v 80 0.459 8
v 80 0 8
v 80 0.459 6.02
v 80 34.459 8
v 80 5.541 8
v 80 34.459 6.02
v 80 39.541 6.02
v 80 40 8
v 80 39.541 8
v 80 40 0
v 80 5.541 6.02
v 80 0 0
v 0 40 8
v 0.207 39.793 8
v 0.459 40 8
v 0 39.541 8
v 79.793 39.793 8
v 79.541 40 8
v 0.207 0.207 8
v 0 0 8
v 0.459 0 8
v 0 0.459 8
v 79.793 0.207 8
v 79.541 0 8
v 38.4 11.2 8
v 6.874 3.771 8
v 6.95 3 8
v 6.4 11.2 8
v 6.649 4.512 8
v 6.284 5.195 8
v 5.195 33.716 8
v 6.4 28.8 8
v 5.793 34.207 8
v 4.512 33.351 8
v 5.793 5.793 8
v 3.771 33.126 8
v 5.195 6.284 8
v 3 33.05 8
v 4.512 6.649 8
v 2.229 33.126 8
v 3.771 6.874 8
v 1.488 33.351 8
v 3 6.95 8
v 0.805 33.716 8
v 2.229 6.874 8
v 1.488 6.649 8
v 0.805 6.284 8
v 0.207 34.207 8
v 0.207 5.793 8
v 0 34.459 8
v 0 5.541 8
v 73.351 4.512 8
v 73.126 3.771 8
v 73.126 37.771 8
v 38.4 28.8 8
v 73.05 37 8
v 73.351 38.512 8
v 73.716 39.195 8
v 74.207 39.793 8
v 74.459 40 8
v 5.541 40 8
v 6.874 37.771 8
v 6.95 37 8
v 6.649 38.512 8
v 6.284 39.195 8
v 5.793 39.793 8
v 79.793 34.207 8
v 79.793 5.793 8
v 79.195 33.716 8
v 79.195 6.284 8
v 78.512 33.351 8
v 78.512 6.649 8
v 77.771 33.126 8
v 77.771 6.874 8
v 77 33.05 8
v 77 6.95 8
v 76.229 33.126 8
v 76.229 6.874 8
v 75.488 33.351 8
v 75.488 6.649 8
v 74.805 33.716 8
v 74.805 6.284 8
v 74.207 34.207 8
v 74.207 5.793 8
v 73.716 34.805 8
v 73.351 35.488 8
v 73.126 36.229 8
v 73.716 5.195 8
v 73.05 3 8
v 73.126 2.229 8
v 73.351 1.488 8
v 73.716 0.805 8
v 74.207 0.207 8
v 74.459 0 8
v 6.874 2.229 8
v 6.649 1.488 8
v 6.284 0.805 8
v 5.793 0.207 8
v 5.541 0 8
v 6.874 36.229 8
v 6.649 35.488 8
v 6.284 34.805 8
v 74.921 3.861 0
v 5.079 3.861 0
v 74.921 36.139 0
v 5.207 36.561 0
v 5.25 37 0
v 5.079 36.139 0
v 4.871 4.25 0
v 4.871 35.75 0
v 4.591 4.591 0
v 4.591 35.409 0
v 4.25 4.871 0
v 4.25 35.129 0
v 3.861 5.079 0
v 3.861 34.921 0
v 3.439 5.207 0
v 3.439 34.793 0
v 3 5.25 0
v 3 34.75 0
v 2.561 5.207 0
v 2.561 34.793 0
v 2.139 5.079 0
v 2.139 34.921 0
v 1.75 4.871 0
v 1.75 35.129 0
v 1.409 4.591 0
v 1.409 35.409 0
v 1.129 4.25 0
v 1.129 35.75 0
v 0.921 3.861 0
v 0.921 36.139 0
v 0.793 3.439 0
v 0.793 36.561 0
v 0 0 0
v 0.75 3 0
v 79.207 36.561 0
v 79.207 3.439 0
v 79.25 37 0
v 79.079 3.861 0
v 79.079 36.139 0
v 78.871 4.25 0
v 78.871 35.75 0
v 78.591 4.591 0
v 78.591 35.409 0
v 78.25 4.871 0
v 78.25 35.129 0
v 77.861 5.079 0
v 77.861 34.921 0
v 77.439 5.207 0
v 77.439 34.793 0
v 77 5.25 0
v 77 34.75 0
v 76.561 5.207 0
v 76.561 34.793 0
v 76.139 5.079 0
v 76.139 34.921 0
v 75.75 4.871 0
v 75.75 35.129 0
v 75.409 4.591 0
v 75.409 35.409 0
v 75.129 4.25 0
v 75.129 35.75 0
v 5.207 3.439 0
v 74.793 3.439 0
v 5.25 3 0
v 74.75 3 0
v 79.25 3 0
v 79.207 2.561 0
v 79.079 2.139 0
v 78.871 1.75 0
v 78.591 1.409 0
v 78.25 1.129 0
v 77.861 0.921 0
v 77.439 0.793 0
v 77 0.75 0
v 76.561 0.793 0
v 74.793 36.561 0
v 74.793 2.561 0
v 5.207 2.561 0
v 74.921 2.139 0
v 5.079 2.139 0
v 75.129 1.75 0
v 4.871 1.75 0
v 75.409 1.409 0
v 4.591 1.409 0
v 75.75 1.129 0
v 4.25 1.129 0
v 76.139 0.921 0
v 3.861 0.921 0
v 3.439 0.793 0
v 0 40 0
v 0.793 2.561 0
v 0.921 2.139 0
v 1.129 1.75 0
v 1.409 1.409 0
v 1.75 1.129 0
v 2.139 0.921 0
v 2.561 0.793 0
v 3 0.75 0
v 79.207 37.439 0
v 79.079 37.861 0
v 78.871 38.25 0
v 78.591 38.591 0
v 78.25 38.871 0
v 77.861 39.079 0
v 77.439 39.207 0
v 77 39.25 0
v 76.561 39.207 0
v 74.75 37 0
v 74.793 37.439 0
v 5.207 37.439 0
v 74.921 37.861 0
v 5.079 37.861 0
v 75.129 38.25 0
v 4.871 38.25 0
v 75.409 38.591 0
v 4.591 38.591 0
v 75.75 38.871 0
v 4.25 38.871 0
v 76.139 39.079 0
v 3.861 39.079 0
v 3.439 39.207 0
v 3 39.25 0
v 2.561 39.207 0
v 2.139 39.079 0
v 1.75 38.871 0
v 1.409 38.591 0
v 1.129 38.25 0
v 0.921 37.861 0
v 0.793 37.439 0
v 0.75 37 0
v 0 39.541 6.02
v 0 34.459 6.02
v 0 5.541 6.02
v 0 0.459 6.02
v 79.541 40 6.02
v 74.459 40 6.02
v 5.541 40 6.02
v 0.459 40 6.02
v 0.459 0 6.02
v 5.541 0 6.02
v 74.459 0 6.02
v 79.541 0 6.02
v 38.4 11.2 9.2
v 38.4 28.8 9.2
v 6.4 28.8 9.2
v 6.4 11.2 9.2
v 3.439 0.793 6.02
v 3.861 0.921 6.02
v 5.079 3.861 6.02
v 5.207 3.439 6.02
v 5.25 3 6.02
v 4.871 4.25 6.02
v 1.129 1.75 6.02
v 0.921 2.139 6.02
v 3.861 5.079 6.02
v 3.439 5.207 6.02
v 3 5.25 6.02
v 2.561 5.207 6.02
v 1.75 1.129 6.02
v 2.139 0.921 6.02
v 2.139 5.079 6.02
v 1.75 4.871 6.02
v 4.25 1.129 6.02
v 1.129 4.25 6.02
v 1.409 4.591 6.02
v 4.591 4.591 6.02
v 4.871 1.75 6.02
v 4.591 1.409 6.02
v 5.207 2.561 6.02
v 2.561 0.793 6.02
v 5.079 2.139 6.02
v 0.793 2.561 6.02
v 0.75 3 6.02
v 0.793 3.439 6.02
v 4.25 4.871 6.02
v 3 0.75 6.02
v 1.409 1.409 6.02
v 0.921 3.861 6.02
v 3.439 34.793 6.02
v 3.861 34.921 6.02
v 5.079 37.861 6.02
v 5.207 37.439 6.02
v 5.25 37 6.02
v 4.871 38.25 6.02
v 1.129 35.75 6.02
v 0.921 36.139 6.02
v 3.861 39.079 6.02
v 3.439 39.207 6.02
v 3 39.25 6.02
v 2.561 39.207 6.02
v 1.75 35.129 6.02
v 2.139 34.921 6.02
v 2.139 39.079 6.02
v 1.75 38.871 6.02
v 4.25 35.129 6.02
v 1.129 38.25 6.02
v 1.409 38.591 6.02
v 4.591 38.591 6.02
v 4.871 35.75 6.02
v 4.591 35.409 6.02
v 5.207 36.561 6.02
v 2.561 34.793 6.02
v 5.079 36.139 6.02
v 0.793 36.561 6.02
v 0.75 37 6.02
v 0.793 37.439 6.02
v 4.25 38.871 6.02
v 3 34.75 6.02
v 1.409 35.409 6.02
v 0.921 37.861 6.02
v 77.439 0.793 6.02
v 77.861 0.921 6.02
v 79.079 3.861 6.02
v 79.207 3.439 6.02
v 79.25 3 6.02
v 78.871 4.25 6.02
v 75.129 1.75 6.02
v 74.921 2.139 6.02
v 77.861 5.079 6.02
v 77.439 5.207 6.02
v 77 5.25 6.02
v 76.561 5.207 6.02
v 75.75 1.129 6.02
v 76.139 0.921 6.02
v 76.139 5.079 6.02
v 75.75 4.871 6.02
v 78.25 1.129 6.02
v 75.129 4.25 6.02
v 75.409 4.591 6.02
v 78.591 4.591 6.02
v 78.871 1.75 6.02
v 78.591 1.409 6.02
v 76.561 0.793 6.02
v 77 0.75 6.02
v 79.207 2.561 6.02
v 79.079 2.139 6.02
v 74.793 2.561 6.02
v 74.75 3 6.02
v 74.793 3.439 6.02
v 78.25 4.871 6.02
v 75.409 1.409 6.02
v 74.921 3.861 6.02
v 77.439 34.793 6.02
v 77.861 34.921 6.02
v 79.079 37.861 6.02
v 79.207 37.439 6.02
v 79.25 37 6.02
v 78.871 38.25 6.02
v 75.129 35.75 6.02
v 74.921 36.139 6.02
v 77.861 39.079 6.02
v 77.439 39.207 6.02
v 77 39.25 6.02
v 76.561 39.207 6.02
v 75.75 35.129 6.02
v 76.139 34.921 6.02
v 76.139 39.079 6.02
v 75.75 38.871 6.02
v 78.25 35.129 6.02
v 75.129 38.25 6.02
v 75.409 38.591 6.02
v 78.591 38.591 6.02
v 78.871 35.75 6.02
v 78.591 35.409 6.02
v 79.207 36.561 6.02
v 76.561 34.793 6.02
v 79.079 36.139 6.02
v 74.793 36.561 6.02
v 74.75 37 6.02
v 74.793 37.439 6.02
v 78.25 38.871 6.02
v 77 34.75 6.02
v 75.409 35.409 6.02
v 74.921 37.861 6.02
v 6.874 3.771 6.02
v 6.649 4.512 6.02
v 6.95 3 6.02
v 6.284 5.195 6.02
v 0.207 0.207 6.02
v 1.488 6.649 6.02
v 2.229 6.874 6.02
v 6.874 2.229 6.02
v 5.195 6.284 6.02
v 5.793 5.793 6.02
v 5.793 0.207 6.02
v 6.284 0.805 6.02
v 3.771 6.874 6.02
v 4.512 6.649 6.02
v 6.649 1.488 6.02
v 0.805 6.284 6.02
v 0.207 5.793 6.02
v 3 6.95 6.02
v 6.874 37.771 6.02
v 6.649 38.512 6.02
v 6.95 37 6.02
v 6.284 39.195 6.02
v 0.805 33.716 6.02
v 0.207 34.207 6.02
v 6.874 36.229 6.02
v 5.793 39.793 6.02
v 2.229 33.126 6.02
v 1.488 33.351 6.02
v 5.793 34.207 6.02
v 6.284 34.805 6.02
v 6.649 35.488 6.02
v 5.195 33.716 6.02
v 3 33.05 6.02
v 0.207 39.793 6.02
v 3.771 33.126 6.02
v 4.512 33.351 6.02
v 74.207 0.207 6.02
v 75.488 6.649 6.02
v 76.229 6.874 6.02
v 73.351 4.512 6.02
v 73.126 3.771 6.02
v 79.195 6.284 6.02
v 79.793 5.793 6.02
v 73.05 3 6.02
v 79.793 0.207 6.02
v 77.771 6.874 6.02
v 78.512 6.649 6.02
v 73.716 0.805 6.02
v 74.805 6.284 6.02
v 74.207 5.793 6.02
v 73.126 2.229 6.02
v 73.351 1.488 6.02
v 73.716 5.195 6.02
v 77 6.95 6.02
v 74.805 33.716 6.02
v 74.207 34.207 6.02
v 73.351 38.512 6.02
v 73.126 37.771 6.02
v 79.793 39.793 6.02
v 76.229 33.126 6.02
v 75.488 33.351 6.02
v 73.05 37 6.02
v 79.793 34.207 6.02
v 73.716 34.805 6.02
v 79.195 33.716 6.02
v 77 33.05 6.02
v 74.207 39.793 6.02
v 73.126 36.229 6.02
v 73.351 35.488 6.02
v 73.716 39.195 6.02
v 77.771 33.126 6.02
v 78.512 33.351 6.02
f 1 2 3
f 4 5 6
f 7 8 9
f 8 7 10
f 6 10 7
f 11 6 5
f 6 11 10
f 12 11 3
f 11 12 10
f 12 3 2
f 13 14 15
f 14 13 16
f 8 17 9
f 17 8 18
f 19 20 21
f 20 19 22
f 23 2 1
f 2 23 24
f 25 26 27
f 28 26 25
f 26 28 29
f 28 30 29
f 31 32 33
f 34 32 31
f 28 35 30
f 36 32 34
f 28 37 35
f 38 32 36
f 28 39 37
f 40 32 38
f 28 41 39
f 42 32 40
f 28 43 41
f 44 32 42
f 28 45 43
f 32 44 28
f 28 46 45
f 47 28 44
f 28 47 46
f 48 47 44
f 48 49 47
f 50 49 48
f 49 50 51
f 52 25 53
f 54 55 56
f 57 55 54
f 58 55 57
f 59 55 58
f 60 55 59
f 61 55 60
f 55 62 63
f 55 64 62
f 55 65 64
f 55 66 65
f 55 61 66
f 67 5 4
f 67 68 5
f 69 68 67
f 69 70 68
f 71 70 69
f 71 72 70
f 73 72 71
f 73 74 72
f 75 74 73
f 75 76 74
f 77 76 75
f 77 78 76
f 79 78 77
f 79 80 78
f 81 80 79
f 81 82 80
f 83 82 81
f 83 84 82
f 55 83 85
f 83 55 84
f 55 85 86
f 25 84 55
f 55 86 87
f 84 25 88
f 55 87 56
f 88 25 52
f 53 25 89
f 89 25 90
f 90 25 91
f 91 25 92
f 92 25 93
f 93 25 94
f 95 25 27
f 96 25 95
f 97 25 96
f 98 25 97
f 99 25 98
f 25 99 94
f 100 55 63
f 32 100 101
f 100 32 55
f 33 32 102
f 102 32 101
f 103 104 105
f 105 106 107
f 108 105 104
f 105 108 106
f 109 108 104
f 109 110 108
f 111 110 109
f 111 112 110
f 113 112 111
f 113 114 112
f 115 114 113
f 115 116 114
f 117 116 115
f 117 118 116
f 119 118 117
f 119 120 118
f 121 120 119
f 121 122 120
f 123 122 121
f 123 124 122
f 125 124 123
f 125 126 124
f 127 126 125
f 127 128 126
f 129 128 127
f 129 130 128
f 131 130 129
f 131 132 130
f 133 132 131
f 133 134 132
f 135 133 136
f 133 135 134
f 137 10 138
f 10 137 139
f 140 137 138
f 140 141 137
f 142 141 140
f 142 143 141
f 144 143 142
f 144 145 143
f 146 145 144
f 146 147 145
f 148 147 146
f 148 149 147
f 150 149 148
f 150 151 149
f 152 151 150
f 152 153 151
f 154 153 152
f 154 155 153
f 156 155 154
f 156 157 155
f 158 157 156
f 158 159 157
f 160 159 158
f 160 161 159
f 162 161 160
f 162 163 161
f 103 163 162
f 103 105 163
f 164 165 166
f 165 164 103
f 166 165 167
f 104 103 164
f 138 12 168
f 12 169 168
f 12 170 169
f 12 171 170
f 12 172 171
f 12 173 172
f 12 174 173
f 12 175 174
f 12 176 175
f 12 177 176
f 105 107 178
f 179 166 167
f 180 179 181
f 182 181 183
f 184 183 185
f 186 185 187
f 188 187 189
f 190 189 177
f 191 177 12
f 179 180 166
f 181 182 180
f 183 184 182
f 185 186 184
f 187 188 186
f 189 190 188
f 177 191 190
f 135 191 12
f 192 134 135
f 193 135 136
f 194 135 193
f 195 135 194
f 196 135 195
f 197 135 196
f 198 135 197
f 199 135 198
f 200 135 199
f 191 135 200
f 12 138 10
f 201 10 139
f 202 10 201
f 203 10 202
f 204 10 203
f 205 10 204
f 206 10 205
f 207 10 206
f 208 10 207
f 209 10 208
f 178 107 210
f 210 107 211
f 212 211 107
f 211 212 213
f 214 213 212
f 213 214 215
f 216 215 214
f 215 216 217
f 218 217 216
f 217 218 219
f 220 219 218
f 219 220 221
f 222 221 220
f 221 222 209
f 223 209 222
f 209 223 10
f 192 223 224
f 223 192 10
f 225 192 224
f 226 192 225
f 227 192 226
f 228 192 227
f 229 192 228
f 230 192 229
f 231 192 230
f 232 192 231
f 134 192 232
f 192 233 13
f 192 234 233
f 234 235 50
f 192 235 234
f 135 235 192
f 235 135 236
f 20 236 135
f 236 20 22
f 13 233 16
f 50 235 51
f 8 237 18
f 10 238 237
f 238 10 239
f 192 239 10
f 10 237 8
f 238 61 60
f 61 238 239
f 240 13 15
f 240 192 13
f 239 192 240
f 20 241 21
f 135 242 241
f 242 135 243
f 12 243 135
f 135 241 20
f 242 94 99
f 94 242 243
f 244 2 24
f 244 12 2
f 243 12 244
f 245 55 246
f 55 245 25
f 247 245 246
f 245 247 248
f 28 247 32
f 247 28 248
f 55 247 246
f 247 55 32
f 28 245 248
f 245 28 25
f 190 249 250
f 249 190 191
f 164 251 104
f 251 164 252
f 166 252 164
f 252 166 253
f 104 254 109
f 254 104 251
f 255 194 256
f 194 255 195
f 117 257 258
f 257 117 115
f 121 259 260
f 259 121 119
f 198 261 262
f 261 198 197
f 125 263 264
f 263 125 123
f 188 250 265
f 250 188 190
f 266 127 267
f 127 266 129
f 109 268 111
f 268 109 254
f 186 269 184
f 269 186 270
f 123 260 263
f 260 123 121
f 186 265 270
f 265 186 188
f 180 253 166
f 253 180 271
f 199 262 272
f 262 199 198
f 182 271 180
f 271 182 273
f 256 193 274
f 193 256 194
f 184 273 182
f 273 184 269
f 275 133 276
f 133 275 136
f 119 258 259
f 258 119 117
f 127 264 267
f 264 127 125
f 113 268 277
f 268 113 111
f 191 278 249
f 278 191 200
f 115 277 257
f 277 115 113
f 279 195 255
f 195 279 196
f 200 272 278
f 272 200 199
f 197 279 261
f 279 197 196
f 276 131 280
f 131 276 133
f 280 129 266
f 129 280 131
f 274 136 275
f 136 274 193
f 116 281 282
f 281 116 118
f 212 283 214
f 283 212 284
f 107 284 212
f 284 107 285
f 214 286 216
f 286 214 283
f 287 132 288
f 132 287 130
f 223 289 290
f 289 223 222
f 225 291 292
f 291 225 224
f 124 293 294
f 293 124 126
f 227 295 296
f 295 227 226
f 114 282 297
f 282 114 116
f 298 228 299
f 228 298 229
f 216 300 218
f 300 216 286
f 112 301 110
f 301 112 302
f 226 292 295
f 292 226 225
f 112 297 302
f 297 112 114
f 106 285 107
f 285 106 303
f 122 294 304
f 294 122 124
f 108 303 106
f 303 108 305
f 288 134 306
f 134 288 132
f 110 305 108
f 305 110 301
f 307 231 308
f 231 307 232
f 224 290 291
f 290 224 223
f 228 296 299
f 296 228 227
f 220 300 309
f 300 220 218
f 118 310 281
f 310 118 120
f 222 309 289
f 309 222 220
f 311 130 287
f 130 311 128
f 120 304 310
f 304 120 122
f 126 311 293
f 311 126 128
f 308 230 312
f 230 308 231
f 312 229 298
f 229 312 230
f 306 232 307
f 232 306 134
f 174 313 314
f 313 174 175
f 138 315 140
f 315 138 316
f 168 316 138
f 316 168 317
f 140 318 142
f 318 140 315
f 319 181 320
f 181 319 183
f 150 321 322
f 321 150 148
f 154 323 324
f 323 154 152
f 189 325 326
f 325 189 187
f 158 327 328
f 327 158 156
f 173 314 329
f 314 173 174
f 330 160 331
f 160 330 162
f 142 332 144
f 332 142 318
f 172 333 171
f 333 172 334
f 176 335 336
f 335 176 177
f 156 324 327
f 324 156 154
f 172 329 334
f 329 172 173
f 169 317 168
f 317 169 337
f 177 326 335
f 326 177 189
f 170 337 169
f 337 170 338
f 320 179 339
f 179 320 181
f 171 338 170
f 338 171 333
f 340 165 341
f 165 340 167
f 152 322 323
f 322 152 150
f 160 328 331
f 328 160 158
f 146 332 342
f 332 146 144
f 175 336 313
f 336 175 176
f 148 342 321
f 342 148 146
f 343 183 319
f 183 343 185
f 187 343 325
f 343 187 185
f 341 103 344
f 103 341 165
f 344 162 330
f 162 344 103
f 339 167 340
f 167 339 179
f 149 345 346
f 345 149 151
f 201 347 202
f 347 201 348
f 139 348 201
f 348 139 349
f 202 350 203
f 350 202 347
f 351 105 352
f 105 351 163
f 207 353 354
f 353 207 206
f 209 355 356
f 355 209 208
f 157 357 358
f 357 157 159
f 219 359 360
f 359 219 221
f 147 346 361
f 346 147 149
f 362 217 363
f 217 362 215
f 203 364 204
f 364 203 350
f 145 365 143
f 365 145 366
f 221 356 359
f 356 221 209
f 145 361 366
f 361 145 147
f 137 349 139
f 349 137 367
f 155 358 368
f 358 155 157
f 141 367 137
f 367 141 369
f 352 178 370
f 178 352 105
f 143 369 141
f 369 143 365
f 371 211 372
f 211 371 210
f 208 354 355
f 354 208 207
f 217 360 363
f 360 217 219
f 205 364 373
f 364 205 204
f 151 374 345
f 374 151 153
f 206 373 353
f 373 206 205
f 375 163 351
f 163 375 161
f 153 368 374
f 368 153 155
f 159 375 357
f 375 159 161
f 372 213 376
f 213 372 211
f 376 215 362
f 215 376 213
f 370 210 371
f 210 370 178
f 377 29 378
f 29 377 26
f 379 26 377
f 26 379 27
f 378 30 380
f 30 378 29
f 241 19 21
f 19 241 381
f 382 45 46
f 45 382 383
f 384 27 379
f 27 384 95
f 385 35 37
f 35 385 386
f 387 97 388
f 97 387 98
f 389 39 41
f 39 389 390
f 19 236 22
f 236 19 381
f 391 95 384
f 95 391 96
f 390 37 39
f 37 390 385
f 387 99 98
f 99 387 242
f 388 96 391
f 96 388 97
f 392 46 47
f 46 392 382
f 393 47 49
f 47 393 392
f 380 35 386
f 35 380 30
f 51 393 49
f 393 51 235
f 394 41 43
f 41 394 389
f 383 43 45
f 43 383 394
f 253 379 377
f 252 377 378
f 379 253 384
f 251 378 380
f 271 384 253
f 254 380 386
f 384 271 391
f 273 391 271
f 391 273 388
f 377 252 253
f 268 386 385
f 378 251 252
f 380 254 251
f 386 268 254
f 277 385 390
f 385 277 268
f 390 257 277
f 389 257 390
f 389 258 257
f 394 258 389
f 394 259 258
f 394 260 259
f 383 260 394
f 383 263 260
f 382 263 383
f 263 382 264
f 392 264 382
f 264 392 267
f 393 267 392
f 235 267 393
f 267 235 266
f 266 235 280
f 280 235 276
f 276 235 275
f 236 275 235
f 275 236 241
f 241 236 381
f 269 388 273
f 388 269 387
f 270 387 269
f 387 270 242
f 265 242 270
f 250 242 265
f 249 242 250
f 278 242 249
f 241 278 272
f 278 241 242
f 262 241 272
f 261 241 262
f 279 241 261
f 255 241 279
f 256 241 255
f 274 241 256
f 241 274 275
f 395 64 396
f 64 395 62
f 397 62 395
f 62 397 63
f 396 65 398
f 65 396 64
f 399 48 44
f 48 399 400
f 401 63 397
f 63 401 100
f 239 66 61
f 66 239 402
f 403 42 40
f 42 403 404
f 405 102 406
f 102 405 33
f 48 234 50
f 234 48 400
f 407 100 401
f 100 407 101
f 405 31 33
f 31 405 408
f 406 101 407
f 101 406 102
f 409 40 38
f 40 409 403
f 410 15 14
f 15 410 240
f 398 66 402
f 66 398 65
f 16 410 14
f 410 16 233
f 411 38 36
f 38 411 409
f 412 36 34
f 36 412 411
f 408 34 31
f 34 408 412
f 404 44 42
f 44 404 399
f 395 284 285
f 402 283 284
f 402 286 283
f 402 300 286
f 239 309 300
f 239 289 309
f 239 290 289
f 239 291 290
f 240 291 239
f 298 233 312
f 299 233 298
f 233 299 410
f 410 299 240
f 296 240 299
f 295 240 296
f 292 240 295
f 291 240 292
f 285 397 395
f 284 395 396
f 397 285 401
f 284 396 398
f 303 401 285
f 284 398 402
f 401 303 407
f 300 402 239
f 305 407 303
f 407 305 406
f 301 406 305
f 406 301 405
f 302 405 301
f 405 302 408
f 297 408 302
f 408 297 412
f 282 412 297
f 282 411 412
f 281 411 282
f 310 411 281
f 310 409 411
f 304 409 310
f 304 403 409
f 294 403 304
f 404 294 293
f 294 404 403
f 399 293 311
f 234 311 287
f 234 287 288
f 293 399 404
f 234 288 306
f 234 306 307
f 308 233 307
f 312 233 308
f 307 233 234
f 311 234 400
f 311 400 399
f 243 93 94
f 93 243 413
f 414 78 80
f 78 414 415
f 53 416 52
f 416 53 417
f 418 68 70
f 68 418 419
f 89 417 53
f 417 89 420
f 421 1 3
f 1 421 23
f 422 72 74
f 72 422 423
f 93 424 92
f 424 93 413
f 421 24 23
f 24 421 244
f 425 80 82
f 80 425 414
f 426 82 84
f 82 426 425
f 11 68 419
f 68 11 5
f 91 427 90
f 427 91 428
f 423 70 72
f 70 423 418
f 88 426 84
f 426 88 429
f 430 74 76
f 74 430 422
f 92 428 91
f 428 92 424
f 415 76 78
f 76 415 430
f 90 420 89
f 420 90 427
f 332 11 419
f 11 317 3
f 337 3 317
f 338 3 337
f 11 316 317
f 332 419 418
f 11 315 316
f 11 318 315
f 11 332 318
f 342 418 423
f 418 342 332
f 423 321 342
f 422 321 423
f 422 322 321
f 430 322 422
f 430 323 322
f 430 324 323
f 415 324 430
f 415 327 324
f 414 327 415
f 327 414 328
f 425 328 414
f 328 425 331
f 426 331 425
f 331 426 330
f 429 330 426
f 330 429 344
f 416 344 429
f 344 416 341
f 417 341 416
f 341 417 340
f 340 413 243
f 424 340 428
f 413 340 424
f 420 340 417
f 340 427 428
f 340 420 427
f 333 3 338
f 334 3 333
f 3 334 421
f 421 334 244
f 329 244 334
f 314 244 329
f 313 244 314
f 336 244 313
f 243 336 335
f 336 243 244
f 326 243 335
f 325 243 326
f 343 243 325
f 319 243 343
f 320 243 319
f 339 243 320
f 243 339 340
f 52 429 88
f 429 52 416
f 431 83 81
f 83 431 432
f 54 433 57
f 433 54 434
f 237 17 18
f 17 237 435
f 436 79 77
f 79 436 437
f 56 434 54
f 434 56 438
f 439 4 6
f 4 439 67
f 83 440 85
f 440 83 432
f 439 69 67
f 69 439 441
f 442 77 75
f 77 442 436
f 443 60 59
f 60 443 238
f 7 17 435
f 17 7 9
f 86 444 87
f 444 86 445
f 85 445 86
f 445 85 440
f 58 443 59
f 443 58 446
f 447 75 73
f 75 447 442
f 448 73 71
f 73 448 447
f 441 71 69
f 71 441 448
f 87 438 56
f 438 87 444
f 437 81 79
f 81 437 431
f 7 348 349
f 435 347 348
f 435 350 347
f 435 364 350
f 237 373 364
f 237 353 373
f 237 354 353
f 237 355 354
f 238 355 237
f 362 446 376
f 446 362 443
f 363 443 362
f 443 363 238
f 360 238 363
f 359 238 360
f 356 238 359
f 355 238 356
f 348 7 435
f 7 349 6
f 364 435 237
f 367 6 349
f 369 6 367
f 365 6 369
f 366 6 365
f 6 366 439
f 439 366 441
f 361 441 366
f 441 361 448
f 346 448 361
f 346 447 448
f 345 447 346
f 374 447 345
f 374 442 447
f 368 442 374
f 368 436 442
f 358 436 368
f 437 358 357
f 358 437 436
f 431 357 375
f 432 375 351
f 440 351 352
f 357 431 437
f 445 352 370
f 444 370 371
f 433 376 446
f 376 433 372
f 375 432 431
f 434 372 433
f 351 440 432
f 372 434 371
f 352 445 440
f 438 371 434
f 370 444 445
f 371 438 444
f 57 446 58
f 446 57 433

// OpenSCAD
$fn = 32;

// ----------------------------------------------------------------------
// Enclosure lid: 80 x 40 x 8 mm, 4 bolt holes
// ----------------------------------------------------------------------

// --- parameters (mm) ---
length = 80;              // lid length, X
width = 40;               // lid width, Y
plate_t = 8;              // lid plate thickness
bolt_d = 4.5;             // bolt clearance
boss_lip = 3;             // bolt hole inset from the corner
sink = 1;                 // overlap of the lip and ribs into the plate
cs_d = 7.9;               // countersink diameter
cs_h = 1.98;              // countersink depth
label_h = 1.2;            // raised marking pad

module plate() {
  cube([length, width, plate_t]);
  /* raised marking pad on top, sunk 1 mm into the plate */
  translate([length * 0.08, width * 0.28, plate_t - 1]) cube([length * 0.4, width * 0.44, label_h + 1]);
}

difference() {
  plate();
  /* bolt pattern matching the corner bosses */
  for (sx = [0, 1]) for (sy = [0, 1])
    translate([sx * (length - 2 * boss_lip) + boss_lip, sy * (width - 2 * boss_lip) + boss_lip, -0 - 1])
      cylinder(h = plate_t + 0 + 2, d = bolt_d);
  /* countersinks so the heads sit flush */
  for (sx = [0, 1]) for (sy = [0, 1])
    translate([sx * (length - 2 * boss_lip) + boss_lip, sy * (width - 2 * boss_lip) + boss_lip, plate_t - cs_h])
      cylinder(h = cs_h + 0.5, d = cs_d);
}
